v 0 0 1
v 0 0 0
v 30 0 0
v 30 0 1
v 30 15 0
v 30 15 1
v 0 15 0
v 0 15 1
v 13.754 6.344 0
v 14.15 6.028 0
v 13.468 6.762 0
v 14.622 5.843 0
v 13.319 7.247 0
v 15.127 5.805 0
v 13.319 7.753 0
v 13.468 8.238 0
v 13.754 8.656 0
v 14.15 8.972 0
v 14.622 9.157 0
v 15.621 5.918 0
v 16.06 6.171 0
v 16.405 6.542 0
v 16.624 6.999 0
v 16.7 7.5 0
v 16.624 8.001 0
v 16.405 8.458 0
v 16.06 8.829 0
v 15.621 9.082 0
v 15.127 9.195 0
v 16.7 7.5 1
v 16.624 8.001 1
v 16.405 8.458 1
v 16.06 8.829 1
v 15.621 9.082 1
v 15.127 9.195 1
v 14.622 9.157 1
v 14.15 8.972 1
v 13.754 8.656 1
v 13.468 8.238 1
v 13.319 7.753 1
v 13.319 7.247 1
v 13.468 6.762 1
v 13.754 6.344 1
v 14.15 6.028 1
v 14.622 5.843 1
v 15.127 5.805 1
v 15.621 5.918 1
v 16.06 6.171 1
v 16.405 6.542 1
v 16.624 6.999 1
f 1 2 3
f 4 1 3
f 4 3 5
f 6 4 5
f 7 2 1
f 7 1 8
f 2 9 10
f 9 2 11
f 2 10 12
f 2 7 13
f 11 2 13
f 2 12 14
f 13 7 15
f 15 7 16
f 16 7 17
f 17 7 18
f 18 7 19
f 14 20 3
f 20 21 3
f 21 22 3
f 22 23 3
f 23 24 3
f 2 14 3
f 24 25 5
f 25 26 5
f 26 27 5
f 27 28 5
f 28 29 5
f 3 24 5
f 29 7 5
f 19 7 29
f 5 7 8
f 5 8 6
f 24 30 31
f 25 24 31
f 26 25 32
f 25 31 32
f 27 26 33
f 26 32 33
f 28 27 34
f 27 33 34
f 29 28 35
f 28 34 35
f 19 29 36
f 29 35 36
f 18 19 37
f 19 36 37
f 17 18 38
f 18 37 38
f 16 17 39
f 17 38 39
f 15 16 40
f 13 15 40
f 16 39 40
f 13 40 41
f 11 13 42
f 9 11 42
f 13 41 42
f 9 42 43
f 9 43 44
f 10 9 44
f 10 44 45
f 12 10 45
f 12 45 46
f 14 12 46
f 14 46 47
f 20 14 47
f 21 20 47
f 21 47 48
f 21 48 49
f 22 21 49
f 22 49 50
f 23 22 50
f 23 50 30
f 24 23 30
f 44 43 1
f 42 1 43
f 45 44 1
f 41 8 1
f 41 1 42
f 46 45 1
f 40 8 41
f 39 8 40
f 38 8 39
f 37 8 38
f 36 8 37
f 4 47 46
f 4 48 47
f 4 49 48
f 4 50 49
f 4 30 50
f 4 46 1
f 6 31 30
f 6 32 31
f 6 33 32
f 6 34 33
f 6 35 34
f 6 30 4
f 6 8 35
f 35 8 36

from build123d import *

# Parameters (mm, degrees)
SKETCH1_W            = 30
SKETCH1_H            = 15
BOSS_EXTRUDE1_DEPTH  = 1
M3_CLEARANCE_HOLE1_D = 3.4


with BuildPart() as part:
    # Sketch1 → Boss-Extrude1 (new body)
    with BuildSketch(Plane.XY):
        with Locations((15, 7.5)):
            Rectangle(SKETCH1_W, SKETCH1_H)
    extrude(amount=BOSS_EXTRUDE1_DEPTH)

    # M3 Clearance Hole1 (through all)
    with Locations(Plane(origin=(0, 0, 0), x_dir=(-1, 0, 0), z_dir=(0, 0, -1))):
        with Locations((-15, 7.5)):
            Hole(M3_CLEARANCE_HOLE1_D / 2)


solid = part.part
